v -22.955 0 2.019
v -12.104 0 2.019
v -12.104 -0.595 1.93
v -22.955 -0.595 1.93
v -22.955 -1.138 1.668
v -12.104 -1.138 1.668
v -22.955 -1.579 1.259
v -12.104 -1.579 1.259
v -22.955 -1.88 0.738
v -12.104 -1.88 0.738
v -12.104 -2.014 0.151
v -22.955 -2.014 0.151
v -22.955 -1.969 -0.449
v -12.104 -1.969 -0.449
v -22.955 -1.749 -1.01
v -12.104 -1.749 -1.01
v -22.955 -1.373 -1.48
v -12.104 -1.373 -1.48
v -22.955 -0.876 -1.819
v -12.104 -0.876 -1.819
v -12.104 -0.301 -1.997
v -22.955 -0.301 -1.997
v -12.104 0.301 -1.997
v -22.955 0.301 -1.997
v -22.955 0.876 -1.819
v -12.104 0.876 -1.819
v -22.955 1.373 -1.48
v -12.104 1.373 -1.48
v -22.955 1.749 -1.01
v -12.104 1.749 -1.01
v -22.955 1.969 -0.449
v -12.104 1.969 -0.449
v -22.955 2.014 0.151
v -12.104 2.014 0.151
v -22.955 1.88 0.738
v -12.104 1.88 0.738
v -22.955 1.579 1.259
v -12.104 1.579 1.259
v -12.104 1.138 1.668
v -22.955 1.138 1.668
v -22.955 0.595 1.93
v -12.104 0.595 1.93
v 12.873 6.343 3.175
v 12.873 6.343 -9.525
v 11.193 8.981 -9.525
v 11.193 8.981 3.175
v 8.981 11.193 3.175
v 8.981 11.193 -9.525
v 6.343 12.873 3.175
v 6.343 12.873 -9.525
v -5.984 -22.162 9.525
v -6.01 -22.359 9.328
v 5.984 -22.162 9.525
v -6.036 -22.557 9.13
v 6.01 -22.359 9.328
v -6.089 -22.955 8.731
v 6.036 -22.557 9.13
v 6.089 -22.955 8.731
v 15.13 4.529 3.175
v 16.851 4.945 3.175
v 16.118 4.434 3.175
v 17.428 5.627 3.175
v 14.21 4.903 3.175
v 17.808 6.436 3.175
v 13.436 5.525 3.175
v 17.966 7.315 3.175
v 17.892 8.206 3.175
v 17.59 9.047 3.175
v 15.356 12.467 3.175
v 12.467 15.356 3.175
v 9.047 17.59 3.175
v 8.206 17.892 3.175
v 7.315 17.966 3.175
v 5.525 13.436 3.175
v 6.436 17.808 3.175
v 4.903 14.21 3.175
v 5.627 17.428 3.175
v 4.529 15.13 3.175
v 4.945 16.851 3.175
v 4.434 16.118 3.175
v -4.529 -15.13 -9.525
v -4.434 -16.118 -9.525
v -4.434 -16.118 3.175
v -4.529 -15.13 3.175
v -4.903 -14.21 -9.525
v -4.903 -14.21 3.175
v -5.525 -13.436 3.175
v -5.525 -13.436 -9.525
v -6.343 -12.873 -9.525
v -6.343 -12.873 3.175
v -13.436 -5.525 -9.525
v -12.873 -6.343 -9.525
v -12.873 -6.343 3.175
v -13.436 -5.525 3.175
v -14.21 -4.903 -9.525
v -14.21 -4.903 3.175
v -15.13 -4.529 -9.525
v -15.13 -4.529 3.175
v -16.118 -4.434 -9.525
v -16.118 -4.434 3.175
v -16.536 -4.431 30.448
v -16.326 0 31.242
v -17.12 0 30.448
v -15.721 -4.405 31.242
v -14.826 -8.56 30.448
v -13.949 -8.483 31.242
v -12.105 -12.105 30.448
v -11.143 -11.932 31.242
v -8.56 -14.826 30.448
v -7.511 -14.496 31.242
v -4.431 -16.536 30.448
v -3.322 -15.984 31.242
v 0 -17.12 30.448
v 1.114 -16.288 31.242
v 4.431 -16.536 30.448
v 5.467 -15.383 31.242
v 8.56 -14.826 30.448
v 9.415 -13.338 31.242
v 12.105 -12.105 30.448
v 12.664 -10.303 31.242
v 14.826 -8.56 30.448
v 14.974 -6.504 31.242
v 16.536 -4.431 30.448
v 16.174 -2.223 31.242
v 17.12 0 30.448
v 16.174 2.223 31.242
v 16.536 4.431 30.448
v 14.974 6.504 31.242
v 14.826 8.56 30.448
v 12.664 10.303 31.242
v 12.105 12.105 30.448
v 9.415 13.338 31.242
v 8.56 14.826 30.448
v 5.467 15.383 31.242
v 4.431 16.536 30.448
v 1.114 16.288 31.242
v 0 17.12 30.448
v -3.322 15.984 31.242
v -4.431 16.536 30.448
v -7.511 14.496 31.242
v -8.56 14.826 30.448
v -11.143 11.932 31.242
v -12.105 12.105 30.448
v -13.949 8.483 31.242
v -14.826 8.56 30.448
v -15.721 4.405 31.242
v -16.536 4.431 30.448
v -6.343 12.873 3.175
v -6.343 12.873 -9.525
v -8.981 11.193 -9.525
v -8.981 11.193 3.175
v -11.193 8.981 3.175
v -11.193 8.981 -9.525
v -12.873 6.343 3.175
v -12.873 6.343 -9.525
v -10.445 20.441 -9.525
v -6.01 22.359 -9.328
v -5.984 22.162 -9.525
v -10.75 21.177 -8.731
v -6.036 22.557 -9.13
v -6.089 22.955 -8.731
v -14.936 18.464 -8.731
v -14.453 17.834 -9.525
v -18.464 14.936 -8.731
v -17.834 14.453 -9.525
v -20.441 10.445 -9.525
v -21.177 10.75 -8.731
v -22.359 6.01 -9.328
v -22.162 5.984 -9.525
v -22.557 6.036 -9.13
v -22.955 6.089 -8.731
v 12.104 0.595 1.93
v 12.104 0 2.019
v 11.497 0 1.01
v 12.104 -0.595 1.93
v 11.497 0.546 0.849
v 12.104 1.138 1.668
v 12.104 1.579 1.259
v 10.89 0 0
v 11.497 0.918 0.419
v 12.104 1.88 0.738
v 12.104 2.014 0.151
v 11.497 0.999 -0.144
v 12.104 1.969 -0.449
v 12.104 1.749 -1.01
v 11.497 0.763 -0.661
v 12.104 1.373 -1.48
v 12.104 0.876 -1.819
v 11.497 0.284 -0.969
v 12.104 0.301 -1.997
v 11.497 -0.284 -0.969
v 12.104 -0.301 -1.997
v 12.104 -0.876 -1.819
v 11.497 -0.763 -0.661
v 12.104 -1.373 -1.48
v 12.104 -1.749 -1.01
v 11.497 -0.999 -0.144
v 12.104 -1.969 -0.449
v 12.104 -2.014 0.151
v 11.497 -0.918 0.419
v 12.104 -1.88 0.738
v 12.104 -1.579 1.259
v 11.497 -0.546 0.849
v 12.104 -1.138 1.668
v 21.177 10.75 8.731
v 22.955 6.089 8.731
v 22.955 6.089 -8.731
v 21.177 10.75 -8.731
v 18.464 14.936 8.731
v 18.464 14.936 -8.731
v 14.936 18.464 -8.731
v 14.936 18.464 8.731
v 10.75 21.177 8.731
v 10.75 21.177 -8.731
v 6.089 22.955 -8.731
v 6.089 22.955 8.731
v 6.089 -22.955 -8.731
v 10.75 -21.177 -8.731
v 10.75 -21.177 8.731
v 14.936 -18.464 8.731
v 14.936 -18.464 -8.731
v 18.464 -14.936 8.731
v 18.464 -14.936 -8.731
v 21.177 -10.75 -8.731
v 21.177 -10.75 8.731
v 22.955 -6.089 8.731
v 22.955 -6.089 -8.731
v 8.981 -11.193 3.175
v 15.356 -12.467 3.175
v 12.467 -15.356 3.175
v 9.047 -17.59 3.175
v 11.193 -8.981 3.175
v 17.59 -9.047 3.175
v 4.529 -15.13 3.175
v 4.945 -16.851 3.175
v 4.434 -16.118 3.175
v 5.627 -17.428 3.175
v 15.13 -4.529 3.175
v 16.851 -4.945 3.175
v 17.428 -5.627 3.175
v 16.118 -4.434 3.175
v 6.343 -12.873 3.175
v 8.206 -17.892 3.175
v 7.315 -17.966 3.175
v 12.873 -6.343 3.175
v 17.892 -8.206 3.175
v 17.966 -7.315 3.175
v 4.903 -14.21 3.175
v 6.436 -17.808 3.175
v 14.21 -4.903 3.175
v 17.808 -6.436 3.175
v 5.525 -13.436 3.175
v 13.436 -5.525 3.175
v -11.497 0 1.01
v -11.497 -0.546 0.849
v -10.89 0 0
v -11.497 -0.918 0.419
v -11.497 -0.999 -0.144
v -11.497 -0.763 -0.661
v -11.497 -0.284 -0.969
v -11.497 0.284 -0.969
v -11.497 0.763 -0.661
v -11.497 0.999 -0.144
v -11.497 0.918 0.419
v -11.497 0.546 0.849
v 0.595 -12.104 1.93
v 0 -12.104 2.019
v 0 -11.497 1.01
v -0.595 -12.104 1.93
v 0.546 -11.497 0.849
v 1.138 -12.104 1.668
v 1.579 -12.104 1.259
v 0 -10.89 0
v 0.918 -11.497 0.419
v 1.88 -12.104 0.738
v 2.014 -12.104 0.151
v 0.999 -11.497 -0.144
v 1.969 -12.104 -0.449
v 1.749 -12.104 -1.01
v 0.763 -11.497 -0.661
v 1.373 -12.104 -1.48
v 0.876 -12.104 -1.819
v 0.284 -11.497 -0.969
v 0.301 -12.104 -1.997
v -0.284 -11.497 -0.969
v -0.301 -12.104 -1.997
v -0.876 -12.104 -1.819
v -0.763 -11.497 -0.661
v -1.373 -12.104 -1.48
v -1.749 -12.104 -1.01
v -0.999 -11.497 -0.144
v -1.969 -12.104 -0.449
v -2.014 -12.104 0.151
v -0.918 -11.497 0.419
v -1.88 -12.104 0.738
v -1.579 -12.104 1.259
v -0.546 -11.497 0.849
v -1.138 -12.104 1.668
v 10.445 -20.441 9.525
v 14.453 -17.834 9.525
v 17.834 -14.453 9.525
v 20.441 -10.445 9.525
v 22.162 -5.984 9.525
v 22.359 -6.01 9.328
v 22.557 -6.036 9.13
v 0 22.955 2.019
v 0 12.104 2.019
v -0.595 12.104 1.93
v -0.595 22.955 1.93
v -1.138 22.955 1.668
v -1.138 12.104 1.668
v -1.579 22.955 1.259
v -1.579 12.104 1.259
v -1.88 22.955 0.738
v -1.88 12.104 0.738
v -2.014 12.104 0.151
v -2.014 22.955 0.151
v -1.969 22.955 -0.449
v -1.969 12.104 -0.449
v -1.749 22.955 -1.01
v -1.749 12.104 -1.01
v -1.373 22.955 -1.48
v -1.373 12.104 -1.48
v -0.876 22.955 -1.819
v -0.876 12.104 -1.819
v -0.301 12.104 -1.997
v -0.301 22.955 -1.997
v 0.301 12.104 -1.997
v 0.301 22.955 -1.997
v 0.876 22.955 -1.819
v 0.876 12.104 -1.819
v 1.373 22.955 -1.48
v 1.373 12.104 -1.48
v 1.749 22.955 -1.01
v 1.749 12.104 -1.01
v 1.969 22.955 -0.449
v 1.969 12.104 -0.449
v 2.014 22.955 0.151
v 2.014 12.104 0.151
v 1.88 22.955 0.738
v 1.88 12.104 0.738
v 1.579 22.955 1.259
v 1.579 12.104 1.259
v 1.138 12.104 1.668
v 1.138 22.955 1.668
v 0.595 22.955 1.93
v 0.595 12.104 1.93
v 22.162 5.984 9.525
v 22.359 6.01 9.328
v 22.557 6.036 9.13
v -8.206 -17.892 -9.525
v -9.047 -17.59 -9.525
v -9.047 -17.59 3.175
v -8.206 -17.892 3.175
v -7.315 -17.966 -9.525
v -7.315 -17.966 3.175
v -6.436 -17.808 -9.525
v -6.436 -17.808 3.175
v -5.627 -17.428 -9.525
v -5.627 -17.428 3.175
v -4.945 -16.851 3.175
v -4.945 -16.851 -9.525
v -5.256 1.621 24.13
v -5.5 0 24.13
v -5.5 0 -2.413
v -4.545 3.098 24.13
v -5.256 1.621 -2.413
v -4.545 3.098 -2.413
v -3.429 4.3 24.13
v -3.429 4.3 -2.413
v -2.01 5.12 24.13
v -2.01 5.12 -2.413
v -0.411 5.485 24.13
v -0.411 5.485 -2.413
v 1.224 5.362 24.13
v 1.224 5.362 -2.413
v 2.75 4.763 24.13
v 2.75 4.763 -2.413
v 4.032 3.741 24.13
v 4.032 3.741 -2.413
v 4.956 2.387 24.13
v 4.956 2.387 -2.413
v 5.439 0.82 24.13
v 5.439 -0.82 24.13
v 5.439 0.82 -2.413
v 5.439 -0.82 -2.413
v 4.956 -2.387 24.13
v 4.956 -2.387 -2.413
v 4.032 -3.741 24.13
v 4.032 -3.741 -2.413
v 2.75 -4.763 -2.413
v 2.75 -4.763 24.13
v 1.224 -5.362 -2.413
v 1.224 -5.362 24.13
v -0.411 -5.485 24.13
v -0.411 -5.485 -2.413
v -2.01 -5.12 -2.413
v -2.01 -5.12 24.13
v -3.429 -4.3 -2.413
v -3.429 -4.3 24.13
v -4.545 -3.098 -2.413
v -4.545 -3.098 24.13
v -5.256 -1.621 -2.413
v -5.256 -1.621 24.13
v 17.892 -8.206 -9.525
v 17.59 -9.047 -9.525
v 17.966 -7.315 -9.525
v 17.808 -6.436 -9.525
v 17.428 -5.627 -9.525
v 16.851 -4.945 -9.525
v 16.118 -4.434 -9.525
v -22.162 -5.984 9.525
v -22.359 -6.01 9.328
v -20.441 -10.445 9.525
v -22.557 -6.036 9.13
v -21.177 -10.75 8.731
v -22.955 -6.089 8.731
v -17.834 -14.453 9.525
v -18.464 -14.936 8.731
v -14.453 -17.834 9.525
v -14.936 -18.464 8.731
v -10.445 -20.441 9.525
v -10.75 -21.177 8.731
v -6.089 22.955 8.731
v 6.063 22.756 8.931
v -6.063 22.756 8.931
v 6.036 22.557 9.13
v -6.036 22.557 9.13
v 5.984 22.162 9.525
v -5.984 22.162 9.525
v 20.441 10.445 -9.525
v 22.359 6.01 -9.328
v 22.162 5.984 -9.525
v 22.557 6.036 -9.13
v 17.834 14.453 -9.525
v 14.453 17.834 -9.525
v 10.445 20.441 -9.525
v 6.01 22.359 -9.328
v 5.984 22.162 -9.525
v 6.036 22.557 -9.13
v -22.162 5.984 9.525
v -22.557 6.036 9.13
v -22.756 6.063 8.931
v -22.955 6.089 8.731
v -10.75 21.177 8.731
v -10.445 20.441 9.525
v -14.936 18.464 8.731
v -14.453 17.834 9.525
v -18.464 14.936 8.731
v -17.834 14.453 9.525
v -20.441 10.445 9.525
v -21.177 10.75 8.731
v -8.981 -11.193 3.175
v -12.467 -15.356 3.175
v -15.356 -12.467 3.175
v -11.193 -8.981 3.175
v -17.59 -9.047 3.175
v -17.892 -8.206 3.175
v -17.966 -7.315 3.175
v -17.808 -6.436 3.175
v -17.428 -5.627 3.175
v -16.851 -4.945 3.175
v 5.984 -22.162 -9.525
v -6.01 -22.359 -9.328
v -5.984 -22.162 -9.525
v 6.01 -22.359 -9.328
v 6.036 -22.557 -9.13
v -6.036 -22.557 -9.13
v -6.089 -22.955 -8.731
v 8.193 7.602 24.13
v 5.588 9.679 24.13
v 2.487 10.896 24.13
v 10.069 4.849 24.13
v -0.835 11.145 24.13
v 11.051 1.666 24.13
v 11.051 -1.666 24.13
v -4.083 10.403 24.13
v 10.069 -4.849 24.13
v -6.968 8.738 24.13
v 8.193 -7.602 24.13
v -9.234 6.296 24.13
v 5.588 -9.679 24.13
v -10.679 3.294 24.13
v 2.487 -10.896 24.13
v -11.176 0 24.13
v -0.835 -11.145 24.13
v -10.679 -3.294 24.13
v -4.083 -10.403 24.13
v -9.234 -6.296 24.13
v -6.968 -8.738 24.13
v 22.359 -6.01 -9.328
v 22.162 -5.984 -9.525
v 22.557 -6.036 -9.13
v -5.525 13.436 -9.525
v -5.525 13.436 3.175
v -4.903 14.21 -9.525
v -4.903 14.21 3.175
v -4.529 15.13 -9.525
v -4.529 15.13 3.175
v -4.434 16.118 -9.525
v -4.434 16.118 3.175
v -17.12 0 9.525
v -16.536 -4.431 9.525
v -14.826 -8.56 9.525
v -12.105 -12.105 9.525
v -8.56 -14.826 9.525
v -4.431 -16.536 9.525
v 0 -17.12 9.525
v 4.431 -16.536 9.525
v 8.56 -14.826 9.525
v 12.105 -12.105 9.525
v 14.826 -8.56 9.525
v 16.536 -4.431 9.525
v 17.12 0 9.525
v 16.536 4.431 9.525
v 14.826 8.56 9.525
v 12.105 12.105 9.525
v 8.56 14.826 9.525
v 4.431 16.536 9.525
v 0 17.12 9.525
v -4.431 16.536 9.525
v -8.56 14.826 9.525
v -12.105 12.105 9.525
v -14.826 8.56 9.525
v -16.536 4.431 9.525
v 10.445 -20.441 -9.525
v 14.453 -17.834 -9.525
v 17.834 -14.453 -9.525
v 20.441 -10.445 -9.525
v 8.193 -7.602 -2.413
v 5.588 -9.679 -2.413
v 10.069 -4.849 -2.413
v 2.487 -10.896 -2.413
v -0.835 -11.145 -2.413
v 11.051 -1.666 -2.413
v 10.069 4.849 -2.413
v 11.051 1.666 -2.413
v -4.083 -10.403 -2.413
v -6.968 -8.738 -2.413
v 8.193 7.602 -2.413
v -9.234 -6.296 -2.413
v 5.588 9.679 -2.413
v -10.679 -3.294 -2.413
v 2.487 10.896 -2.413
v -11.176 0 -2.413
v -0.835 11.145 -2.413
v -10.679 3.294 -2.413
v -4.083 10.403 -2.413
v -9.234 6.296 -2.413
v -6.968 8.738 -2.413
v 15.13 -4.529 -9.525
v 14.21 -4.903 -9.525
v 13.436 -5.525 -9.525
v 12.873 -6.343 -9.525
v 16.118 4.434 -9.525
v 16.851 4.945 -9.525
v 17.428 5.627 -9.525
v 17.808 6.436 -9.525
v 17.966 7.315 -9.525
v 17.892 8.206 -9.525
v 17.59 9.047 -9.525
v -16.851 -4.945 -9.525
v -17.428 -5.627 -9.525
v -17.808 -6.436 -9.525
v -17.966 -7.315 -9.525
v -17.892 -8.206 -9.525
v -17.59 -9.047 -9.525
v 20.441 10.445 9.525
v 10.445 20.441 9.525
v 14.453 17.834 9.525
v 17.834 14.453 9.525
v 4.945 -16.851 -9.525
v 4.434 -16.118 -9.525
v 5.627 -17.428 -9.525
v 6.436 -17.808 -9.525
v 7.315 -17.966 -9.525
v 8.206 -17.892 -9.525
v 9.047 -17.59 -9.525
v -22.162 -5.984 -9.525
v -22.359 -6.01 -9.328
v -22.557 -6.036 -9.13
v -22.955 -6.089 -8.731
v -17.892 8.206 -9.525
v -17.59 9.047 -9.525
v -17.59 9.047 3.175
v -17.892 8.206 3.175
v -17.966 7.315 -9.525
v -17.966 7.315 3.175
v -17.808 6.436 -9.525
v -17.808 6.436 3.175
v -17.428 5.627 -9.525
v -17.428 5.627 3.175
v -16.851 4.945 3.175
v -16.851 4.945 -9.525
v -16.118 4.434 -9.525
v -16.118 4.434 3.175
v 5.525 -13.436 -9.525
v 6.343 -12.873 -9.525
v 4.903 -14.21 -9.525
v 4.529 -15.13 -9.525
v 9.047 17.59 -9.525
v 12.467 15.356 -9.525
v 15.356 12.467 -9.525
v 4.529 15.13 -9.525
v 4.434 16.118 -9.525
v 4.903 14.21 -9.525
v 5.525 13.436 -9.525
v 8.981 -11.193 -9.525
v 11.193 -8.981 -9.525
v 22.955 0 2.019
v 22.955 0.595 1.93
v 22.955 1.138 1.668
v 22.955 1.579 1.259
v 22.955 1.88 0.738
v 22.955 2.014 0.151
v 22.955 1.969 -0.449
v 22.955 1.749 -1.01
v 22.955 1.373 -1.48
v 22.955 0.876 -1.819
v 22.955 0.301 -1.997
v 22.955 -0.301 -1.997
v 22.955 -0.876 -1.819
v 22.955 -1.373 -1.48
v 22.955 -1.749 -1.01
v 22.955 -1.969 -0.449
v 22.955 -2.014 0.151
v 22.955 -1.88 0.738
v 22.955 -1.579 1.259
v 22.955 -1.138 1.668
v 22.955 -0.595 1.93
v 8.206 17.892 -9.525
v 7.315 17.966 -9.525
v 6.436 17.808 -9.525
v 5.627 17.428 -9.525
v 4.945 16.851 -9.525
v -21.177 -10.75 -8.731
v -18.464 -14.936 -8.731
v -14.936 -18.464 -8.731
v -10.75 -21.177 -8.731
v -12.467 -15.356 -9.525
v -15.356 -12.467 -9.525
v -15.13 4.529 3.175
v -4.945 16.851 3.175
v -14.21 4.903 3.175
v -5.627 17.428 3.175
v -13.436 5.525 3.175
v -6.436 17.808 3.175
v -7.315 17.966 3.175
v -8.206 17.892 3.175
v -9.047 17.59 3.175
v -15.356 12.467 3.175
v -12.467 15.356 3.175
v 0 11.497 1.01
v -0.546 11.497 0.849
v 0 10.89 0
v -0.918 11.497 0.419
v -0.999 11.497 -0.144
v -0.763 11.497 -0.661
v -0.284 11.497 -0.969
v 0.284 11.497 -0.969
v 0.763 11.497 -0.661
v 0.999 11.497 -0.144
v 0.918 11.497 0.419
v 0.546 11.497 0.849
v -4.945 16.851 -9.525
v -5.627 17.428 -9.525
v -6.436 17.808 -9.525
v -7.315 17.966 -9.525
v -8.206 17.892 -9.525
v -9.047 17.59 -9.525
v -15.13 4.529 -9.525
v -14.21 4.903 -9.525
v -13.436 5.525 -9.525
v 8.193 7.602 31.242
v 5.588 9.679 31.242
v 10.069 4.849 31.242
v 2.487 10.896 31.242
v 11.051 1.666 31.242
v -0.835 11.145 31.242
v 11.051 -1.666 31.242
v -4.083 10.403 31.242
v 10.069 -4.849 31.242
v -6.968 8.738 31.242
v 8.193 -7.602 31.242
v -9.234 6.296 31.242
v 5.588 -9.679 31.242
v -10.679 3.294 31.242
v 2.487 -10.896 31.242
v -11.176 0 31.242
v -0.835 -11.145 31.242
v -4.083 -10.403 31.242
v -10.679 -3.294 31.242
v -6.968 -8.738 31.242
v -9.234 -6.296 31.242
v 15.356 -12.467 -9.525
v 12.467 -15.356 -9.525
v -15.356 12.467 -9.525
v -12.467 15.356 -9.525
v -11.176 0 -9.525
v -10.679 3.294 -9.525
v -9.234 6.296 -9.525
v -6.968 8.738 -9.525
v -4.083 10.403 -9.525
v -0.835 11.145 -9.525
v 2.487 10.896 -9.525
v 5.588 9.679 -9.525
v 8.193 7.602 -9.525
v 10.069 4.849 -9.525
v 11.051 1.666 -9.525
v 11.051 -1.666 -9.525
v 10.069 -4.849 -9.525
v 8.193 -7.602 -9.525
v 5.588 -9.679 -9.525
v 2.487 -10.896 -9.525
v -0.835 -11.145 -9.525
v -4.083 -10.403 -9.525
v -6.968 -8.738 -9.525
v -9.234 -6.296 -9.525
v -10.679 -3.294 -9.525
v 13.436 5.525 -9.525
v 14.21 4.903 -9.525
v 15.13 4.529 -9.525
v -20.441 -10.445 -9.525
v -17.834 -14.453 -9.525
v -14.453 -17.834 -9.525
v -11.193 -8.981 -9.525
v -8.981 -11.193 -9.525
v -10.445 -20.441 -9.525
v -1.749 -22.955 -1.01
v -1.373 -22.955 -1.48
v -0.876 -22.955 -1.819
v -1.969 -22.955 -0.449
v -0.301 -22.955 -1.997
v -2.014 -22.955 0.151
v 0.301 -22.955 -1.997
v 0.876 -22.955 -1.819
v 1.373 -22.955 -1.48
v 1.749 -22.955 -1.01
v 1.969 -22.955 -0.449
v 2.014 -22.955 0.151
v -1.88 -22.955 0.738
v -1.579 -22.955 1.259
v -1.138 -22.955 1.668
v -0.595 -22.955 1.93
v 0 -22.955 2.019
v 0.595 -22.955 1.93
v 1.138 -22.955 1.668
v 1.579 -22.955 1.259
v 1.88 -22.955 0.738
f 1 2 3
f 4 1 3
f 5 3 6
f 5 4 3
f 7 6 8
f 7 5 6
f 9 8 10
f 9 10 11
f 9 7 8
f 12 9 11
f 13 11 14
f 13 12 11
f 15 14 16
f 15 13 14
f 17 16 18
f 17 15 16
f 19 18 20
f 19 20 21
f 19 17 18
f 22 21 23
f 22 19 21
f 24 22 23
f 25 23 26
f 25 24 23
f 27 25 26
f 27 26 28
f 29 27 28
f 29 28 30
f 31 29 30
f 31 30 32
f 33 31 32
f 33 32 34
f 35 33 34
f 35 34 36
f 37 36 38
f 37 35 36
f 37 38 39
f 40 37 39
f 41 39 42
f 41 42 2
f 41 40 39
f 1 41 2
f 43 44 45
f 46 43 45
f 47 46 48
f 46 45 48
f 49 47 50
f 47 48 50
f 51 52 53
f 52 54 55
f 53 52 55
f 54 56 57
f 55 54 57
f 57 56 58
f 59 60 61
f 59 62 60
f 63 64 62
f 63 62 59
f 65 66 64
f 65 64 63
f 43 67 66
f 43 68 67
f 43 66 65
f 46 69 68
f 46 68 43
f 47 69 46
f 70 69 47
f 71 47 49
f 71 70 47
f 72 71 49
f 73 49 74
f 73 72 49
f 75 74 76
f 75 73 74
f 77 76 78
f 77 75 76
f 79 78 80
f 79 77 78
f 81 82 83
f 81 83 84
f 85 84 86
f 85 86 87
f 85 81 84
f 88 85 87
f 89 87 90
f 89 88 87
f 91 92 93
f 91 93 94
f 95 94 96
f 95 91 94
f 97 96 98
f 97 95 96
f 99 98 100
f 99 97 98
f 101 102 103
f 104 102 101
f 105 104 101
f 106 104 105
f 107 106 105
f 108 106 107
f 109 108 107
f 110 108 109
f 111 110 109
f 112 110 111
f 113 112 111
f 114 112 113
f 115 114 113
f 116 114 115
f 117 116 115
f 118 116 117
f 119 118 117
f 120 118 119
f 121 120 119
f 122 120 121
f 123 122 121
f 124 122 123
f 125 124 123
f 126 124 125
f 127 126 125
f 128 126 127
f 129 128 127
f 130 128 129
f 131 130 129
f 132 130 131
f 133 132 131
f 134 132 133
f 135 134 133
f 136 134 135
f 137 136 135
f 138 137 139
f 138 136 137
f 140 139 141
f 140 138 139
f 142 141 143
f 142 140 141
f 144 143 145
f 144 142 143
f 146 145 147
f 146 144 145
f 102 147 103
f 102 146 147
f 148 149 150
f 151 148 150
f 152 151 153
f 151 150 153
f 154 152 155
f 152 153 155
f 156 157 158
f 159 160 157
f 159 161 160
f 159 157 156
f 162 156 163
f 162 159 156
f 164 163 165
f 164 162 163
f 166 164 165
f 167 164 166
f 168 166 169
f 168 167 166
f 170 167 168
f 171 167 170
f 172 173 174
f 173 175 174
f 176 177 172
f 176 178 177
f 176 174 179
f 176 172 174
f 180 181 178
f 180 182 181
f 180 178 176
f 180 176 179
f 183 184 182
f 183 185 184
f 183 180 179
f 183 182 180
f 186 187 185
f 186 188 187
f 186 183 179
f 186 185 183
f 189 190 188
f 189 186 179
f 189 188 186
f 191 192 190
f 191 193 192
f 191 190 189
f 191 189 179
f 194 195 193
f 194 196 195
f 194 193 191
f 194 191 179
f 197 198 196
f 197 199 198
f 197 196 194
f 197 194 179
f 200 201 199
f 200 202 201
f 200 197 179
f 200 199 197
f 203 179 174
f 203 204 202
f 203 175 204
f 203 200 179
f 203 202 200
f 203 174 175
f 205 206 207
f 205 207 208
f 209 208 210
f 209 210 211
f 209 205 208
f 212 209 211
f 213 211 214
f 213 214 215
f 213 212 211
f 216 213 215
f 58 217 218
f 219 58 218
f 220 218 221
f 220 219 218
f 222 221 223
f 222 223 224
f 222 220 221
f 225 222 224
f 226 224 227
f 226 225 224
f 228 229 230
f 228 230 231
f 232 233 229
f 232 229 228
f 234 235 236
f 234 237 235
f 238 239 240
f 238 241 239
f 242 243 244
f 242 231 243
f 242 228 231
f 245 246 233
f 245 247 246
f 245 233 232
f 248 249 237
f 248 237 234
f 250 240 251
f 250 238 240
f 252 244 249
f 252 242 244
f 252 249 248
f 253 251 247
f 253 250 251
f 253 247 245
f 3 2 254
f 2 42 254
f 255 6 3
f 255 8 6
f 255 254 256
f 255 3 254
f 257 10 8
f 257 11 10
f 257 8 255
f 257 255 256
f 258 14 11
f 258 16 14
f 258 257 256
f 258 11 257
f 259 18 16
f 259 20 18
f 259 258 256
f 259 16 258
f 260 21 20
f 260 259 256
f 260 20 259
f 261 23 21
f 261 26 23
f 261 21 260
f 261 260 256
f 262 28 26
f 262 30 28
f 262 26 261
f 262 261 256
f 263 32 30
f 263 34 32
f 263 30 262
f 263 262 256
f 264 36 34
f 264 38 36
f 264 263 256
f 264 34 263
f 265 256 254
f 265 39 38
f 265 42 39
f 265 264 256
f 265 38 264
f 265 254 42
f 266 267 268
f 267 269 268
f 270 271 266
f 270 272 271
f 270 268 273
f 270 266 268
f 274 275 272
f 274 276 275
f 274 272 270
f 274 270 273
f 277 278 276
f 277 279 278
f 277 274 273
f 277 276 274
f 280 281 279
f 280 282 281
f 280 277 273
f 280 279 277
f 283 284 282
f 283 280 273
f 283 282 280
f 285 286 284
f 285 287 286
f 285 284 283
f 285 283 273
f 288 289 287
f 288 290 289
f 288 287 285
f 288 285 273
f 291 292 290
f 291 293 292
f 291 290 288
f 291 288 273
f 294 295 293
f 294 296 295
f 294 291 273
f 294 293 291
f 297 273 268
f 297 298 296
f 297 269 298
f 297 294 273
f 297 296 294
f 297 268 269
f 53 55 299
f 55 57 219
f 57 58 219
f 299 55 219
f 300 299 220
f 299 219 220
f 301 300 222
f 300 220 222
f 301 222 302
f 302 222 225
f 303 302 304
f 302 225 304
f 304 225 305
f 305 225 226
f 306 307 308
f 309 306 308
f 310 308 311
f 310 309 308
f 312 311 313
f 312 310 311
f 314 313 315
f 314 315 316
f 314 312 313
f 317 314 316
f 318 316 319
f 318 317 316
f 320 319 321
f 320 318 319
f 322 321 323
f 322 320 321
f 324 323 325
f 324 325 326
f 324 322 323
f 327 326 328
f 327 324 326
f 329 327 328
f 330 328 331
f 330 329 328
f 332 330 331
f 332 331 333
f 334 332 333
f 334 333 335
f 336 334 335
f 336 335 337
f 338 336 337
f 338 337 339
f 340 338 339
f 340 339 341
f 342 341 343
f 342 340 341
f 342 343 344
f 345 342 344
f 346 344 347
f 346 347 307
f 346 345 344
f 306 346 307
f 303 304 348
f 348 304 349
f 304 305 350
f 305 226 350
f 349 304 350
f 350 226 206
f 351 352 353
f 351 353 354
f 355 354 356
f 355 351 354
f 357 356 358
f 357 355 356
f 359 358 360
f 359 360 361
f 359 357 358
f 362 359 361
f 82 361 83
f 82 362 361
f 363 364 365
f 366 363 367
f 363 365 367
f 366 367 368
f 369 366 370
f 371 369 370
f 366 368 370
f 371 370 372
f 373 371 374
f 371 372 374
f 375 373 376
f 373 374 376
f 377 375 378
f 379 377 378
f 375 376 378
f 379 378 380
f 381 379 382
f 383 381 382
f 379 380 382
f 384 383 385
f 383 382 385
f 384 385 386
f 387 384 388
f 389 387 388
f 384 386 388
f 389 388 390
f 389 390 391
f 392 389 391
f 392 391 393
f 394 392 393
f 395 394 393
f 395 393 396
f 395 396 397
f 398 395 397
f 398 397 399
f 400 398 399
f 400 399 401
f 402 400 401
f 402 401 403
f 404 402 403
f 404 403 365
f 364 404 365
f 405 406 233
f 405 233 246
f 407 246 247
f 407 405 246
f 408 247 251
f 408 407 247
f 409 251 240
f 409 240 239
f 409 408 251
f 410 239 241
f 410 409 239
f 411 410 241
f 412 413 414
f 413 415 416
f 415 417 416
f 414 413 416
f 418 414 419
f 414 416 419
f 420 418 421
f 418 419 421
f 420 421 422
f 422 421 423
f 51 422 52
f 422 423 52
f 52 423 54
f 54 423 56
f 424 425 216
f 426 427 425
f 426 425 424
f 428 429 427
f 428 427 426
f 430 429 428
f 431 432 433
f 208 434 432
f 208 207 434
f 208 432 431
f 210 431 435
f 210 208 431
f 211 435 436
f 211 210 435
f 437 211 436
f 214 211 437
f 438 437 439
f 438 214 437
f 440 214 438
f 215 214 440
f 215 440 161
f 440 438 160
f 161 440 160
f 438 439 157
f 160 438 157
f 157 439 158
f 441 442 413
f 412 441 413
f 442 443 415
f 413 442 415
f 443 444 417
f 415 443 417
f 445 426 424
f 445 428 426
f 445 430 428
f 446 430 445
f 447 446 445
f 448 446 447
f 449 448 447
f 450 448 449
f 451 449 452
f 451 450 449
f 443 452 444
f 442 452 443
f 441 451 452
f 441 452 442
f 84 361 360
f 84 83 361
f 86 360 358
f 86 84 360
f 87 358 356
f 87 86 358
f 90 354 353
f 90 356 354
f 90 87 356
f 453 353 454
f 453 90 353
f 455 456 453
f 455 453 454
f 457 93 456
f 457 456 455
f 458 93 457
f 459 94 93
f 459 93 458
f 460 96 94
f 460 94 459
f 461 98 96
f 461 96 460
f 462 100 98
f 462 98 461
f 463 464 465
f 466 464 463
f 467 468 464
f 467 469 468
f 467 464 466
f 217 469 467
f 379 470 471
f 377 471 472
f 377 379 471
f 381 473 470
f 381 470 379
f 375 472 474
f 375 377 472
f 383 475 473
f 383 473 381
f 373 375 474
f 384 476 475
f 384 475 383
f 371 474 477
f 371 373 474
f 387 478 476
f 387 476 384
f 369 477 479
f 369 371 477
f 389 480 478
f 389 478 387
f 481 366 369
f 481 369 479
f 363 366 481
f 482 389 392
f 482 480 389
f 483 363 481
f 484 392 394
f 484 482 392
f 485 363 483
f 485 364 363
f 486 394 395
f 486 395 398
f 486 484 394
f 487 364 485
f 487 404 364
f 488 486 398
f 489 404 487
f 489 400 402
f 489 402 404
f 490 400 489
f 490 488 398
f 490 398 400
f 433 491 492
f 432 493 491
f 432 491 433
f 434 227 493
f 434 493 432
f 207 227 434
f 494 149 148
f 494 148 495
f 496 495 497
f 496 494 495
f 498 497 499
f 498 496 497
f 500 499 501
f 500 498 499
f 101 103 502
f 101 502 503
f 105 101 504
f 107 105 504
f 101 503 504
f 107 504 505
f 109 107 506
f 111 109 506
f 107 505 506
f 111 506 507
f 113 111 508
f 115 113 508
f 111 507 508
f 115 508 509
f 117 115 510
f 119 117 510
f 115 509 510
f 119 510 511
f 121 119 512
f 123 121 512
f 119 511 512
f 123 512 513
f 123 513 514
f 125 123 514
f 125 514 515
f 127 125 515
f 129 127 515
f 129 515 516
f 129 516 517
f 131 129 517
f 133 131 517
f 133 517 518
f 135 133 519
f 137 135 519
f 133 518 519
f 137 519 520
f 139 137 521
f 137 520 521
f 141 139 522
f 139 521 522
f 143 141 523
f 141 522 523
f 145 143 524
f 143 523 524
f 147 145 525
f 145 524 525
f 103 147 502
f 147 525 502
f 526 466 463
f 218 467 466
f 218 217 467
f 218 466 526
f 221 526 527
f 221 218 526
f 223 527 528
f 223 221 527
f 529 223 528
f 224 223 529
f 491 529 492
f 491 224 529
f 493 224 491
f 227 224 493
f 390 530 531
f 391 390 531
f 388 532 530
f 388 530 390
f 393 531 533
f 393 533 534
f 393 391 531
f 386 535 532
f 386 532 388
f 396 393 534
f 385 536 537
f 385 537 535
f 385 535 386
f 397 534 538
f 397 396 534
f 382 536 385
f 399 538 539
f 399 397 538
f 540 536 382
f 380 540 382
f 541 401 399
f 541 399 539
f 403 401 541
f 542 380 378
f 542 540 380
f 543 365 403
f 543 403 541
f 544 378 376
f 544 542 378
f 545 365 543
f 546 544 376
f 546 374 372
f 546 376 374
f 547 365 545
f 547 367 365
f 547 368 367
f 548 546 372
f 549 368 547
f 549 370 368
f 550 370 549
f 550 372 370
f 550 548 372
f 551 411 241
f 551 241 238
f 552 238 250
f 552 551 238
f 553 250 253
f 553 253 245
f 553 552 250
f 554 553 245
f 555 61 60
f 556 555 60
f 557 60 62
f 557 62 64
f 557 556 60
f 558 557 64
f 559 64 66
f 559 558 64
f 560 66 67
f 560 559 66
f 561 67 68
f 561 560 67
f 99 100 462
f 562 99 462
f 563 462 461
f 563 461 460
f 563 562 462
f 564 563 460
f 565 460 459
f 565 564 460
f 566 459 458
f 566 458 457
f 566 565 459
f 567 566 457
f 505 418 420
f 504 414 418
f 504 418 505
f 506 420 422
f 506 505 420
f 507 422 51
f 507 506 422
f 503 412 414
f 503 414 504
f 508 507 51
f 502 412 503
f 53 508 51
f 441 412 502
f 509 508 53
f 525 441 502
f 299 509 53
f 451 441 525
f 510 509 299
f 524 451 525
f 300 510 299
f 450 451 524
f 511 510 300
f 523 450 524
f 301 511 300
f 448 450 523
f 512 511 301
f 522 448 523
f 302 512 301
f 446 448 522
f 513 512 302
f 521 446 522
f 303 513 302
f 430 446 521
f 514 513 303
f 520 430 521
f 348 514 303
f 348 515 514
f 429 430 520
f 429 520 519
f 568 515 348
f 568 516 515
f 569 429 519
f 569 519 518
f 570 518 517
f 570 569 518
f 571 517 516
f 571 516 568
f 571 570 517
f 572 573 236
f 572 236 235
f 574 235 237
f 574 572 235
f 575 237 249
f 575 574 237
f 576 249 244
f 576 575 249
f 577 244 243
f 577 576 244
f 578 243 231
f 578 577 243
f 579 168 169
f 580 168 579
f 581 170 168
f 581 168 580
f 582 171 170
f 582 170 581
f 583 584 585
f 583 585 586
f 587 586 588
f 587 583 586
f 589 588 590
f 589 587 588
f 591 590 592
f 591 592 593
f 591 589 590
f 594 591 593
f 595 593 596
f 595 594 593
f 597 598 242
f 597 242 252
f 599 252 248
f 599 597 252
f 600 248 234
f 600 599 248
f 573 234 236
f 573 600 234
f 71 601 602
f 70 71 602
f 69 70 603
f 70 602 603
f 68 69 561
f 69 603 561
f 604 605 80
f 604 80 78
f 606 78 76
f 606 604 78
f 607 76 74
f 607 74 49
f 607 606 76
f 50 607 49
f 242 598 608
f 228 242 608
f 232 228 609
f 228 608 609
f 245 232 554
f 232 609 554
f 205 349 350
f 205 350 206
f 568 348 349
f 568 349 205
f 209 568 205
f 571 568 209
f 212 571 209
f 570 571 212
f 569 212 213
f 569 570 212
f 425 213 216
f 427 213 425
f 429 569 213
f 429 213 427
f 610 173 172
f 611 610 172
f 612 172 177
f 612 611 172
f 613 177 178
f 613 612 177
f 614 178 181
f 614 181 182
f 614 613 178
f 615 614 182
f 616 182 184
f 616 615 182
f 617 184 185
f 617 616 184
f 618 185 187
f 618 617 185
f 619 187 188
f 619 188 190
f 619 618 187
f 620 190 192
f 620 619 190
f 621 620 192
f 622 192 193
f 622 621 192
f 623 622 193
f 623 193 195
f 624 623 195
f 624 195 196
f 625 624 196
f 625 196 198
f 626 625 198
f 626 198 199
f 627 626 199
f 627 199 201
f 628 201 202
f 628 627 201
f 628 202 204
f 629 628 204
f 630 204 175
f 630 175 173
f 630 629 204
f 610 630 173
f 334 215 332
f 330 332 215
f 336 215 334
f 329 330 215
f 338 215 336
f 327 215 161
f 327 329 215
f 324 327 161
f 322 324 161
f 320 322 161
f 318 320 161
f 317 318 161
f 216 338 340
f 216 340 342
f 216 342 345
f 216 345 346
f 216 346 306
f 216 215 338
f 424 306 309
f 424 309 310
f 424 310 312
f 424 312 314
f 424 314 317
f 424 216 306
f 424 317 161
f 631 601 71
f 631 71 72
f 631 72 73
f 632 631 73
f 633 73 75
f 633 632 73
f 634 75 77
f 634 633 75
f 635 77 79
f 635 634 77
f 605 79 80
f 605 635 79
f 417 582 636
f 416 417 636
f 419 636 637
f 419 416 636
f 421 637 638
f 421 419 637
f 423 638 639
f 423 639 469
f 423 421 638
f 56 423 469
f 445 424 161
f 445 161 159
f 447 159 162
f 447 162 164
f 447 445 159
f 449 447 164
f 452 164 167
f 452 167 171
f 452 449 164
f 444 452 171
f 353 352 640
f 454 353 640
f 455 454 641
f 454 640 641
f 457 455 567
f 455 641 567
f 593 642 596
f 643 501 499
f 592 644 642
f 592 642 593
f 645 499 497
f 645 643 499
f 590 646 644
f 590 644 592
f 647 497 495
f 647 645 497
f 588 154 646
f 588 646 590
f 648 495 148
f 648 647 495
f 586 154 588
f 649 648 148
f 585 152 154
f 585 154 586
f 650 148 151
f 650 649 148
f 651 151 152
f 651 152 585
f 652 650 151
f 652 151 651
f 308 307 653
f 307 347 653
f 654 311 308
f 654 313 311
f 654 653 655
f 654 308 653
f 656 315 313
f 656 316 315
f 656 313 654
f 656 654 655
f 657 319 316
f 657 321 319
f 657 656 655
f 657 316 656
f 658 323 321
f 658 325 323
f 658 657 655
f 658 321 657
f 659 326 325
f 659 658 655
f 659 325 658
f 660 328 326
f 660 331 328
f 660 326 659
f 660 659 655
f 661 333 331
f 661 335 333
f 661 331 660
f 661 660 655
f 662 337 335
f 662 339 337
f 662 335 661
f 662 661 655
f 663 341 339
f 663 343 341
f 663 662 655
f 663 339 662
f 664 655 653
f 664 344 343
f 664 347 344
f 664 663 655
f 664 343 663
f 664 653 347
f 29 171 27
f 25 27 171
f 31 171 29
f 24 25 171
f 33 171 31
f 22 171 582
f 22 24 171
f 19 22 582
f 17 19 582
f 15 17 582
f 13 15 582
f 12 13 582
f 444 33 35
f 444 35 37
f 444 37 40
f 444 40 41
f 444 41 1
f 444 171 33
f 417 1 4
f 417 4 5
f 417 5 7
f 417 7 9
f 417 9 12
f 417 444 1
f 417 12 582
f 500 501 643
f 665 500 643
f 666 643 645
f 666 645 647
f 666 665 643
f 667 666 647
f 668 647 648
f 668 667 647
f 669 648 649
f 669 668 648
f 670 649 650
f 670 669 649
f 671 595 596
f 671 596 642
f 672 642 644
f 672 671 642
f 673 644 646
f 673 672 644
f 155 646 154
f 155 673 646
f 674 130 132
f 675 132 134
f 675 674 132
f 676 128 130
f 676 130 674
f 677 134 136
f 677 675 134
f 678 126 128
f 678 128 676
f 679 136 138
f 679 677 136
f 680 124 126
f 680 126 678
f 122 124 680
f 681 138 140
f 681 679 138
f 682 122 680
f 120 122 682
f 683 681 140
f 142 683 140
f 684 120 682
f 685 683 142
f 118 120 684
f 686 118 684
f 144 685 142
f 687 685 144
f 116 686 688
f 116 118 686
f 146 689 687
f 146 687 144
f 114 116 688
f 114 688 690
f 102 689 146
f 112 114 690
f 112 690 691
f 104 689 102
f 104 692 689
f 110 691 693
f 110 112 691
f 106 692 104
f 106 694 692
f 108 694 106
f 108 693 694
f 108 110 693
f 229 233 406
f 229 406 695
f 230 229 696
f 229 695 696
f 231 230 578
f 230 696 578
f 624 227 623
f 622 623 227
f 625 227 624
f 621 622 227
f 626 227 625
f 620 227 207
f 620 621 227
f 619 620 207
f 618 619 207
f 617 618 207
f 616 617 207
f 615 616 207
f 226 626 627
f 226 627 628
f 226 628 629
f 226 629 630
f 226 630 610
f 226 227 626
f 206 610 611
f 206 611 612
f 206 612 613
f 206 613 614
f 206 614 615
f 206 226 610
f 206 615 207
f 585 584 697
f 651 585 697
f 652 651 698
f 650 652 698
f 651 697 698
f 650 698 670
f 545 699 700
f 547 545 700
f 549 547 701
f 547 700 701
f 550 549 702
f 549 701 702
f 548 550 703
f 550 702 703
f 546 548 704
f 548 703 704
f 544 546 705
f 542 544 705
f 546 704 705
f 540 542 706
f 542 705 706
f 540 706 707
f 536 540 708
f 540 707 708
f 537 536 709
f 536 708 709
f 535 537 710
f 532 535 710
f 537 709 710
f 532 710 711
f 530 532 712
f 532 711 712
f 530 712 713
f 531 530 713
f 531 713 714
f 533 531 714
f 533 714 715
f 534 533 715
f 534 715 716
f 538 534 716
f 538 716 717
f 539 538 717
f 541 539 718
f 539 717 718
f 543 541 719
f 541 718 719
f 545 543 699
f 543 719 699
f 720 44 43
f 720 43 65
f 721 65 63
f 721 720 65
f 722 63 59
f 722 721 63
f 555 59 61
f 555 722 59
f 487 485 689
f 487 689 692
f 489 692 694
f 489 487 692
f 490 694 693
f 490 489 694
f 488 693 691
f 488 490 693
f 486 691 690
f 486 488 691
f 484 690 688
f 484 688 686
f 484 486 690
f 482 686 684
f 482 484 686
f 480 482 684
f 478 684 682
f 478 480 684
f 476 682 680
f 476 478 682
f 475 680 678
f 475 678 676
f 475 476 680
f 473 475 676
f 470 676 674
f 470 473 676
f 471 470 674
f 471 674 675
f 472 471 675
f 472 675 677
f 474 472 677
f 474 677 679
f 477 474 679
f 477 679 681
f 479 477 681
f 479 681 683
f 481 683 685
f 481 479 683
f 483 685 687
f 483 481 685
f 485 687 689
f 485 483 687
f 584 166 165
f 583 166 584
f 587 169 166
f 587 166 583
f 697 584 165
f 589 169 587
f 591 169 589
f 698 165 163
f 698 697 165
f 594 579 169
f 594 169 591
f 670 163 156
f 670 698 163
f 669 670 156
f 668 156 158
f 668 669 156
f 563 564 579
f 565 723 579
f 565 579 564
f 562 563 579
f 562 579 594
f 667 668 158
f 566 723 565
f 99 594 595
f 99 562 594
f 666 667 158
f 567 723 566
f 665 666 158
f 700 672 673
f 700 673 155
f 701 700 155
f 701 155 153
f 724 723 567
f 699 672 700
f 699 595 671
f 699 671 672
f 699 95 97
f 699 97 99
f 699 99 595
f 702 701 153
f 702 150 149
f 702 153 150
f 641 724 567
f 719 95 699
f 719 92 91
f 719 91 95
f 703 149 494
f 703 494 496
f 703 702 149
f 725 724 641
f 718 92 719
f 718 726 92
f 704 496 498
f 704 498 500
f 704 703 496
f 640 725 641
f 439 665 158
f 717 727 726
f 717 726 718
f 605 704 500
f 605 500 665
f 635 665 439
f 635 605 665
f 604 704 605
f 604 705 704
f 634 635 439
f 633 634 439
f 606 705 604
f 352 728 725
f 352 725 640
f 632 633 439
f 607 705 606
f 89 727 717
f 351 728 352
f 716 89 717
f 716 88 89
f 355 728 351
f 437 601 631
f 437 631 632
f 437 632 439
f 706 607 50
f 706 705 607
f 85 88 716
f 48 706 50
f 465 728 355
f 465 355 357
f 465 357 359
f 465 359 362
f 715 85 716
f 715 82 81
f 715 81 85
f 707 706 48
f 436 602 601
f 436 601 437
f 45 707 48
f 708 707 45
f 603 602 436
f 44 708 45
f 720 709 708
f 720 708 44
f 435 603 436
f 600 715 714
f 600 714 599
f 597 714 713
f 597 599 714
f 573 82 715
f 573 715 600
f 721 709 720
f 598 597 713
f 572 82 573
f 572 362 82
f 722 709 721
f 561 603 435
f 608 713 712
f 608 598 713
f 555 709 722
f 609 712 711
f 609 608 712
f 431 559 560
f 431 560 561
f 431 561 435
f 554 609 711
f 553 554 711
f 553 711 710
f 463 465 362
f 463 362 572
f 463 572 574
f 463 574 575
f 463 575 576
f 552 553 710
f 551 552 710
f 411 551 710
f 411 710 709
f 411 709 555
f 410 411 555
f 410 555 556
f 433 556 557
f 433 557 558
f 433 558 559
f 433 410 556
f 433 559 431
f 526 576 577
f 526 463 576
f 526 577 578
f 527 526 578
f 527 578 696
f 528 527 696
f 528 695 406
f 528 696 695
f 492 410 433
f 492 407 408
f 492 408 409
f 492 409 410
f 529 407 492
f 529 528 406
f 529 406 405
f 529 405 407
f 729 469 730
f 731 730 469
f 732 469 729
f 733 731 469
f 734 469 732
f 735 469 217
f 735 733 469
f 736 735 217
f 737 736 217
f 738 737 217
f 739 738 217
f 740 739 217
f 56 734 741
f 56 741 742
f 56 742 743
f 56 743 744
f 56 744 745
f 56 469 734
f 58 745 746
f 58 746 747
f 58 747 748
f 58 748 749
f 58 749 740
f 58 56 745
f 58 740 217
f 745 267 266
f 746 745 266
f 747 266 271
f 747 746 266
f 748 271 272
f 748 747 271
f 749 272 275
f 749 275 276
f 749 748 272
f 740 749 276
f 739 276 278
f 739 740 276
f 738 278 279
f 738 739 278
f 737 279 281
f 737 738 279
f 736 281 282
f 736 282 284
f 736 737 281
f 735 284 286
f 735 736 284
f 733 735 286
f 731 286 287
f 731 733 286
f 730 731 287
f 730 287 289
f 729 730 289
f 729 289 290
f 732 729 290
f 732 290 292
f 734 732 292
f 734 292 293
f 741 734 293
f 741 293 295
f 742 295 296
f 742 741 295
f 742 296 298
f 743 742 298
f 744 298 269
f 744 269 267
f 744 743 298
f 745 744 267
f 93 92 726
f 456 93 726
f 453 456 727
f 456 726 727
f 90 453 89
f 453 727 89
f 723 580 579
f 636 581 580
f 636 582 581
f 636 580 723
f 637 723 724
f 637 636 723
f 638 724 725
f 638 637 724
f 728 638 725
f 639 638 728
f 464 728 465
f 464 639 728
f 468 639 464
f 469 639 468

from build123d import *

# Parameters (mm, degrees)
BOSS_EXTRUDE1_DEPTH = 9.525
SKETCH2_R           = 11.176
SKETCH2_R_2         = 5.500370000000001
CUT_EXTRUDE1_DEPTH  = 7.112
SKETCH3_R           = 17.119600000000002
BOSS_EXTRUDE2_DEPTH = 21.717
SKETCH2_3_R         = 5.500370000000001
CUT_EXTRUDE2_DEPTH  = 53.11367665138399
CUT_EXTRUDE3_START  = -7.112
SKETCH4_R           = 11.176
CUT_EXTRUDE3_DEPTH  = 7.112
CIRPATTERN1_COUNT   = 4
CHAMFER2_SIZE       = 0.79375
CUT_EXTRUDE4_DEPTH  = 12.7
FILLET2_R           = 3.429


# Some blends are built 0.0001 mm under size
with BuildPart() as part:
    # Sketch1 → Boss-Extrude1 (new, symmetric)
    with BuildSketch(Plane.XY):
        with BuildLine():
            Line((6.0886368291679185, 22.95525), (-6.0886368291679185, 22.95525))
            ThreePointArc((-6.088636829167921, 22.955250000000003), (-16.793078946399227, 16.793078946399408), (-22.95524999999994, 6.088636829168165))
            Line((-22.95524999999994, 6.08863682916816), (-22.955250000000003, 0))
            Line((-22.955250000000003, 0), (22.95525, 0))
            Line((22.95525, 0), (22.95525000000002, 6.088636829167839))
            ThreePointArc((22.955250000000024, 6.088636829167841), (16.793078946399348, 16.79307894639929), (6.0886368291679185, 22.955250000000003))
        make_face()
        with BuildLine():
            Line((22.95525, 0), (-22.955250000000003, 0))
            Line((-22.955250000000003, 0), (-22.955250000000063, -6.088636829167679))
            ThreePointArc((-22.955250000000067, -6.0886368291676805), (-16.79307894639947, -16.793078946399167), (-6.088636829168085, -22.95524999999996))
            Line((-6.088636829168078, -22.955249999999957), (6.08863682916776, -22.955250000000042))
            ThreePointArc((6.08863682916775, -22.955250000000046), (16.793078946399223, -16.79307894639941), (22.95524999999998, -6.088636829168005))
            Line((22.955249999999978, -6.088636829167999), (22.95525, 0))
        make_face()
    extrude(amount=BOSS_EXTRUDE1_DEPTH, both=True)

    # Sketch2 → Cut-Extrude1 (cut)
    # profile 1 of 2: a face of its own
    with BuildSketch(Plane(origin=(0, 0, -9.525), x_dir=(-1, 0, 0), z_dir=(0, 0, -1))):
        Circle(SKETCH2_R)
        Circle(SKETCH2_R_2, mode=Mode.SUBTRACT)
    # profile 2 of 2: a face of its own
    with BuildSketch(Plane(origin=(0, 0, -9.525), x_dir=(-1, 0, 0), z_dir=(0, 0, -1))):
        Circle(SKETCH2_R_2)
    extrude(amount=-CUT_EXTRUDE1_DEPTH, mode=Mode.SUBTRACT)

    # Sketch3 → Boss-Extrude2 (add)
    with BuildSketch(Plane.XY.offset(9.525)):
        with Locations(Location((0, 0, 0), (0, 0, 180))):
            Circle(SKETCH3_R)
    extrude(amount=BOSS_EXTRUDE2_DEPTH)

    # Sketch2<3> → Cut-Extrude2 (cut, through all)
    with BuildSketch(Plane(origin=(0, 0, -9.525), x_dir=(-1, 0, 0), z_dir=(0, 0, -1))):
        Circle(SKETCH2_3_R)
    extrude(amount=-CUT_EXTRUDE2_DEPTH, mode=Mode.SUBTRACT)

    # Sketch4 → Cut-Extrude3 (cut)
    with BuildSketch(Plane.XY.offset(31.241999999999997).offset(CUT_EXTRUDE3_START)):
        with Locations(Location((0, 0, 0), (0, 0, 180))):
            Circle(SKETCH4_R)
    extrude(amount=CUT_EXTRUDE3_DEPTH, mode=Mode.SUBTRACT)

    # Sketch7 → #10-32 Tapped Hole1 (revolve, cut)
    with BuildSketch(Plane(origin=(-22.95525, 2.3545e-13, 0), x_dir=(0, 0, 1), z_dir=(1.026e-14, 1, 0))):
        Polygon((0, 0), (-3.04e-15, 12.065), (2.019299999999997, 10.851682151997645), (2.0192999999999897, -1.31e-15), align=None)
    f_10_32_tapped_hole1 = revolve(axis=Axis((-29.30524999999999, 3.0058e-13, 0), (1, -1.026e-14, 0)), mode=Mode.SUBTRACT)

    # CirPattern1: #10-32 Tapped Hole1 ×4 about axis
    cirpattern1_axis = Axis((0, 0, 31.241999999999997), (0, 0, 1))
    for i in range(1, CIRPATTERN1_COUNT):
        add(f_10_32_tapped_hole1.rotate(cirpattern1_axis, i * 360 / CIRPATTERN1_COUNT), mode=Mode.SUBTRACT)

    # Chamfer2
    chamfer2_edges = [part.edges().sort_by_distance(p)[0] for p in [
        (16.793078946399344, 16.79307894639929, -9.525),
        (22.95525, -8.171e-14, -9.525),
        (-16.793078946399465, -16.79307894639917, 9.525),
        (16.793078946399223, -16.79307894639941, -9.525),
        (-1.5898e-13, -22.95525, -9.525),
        (-16.793078946399465, -16.79307894639917, -9.525),
        (-22.955250000000003, 2.407e-13, -9.525),
        (-1.5898e-13, -22.95525, 9.525),
        (16.793078946399223, -16.79307894639941, 9.525),
        (22.95525, -8.082e-14, 9.525),
        (16.793078946399344, 16.79307894639929, 9.525),
        (17.119600000000002, -4.19e-15, 31.241999999999997),
        (0, 22.95525, 9.525),
        (-16.79307894639923, 16.79307894639941, 9.525),
        (-22.955250000000003, 2.4158e-13, 9.525),
        (-16.79307894639923, 16.79307894639941, -9.525),
        (0, 22.95525, -9.525),
    ]]
    chamfer(chamfer2_edges, length=CHAMFER2_SIZE - 0.0001)  # a hair under: the kernel refuses the full size

    # Sketch8 → Cut-Extrude4 (cut)
    with BuildSketch(Plane(origin=(0, 0, -9.525), x_dir=(-1, 0, 0), z_dir=(0, 0, -1))):
        with BuildLine():
            ThreePointArc((-3.7411998688127595, -13.854769017980608), (-10.14768941680823, -10.147689416808056), (-13.854769017980674, -3.741199868812521))
            Line((-13.854769017980672, -3.7411998688125214), (-19.096285615491066, -5.156565305907526))
            ThreePointArc((-19.096285615491066, -5.1565653059075265), (-13.986748908565335, -13.98674890856509), (-5.156565305907854, -19.09628561549097))
            Line((-5.156565305907857, -19.096285615490967), (-3.741199868812765, -13.854769017980608))
        make_face()
        with BuildLine():
            ThreePointArc((13.854769017980626, -3.7411998688126986), (10.147689416808095, -10.14768941680819), (3.741199868812558, -13.854769017980665))
            Line((3.7411998688125703, -13.854769017980663), (5.156565305907591, -19.09628561549104))
            ThreePointArc((5.156565305907593, -19.096285615491045), (13.986748908565135, -13.986748908565279), (19.09628561549099, -5.156565305907787))
            Line((19.096285615490988, -5.1565653059077885), (13.854769017980622, -3.741199868812714))
        make_face()
        with BuildLine():
            Line((5.156565305907724, 19.096285615491006), (3.741199868812667, 13.854769017980631))
            ThreePointArc((3.7411998688126653, 13.854769017980633), (10.147689416808161, 10.147689416808124), (13.854769017980649, 3.741199868812616))
            Line((13.854769017980647, 3.741199868812618), (19.096285615491023, 5.156565305907658))
            ThreePointArc((19.096285615491027, 5.15656530590766), (13.98674890856523, 13.986748908565183), (5.156565305907728, 19.09628561549101))
        make_face()
        with BuildLine():
            ThreePointArc((-5.1565653059077246, 19.096285615491006), (-13.986748908565236, 13.986748908565183), (-19.096285615491023, 5.1565653059076535))
            Line((-19.096285615491023, 5.156565305907655), (-13.854769017980647, 3.7411998688126173))
            ThreePointArc((-13.854769017980647, 3.741199868812617), (-10.14768941680816, 10.147689416808126), (-3.741199868812667, 13.854769017980633))
            Line((-3.741199868812666, 13.854769017980635), (-5.1565653059077246, 19.096285615491006))
        make_face()
    extrude(amount=-CUT_EXTRUDE4_DEPTH, mode=Mode.SUBTRACT)

    # Fillet2
    # the kernel refuses this fillet: 3.429 mm, written as the material it adds along each edge
    with BuildSketch(Plane(origin=(-5.156565305907593, -19.096285615491045, -9.525), x_dir=(-0.9325520544220317, 0.3610355464400257, 0), z_dir=(0, 0, 1))) as fillet2_piece_1:
        with BuildLine():
            CenterArc((3.8097835082284277, -3.409884824393312), FILLET2_R, 83.94735795443728, 102.10528409112533)
            Line((0.39989868383511423, -3.771446000921142), (0, 0))
            ThreePointArc((0, 0), (2.085672342378129, 0.11026624447191213), (4.171344684756262, 8e-17))
        make_face()
    extrude(amount=12.7)
    with BuildSketch(Plane(origin=(-19.096285615491027, 5.15656530590766, -9.525), x_dir=(0.965421853388659, -0.26069262551826505, 0), z_dir=(0, 0, 1))) as fillet2_piece_2:
        with BuildLine():
            CenterArc((3.792588020758013, 3.4290000000000003), FILLET2_R, 167.8947159088747, 102.10528409112533)
            ThreePointArc((0.4398356056936713, 4.148091262135922), (0.11026624447190661, 2.0856723423781296), (0, 0))
            Line((0, 0), (3.7925880207580134, -5e-17))
        make_face()
    extrude(amount=12.7)
    with BuildSketch(Plane(origin=(-5.156565305907726, 19.096285615491006, -9.525), x_dir=(0.26069262551826866, -0.9654218533886582, 0), z_dir=(0, 0, 1))) as fillet2_piece_3:
        with BuildLine():
            CenterArc((3.792588020758004, -3.4290000000000003), FILLET2_R, 89.99999999999996, 102.10528409112538)
            ThreePointArc((0.4398356056936635, -4.148091262135923), (0.11026624447190603, -2.0856723423781314), (0, 0))
            Line((0, 0), (3.7925880207580063, -7e-17))
        make_face()
    extrude(amount=12.7)
    with BuildSketch(Plane(origin=(-13.854769017980626, -3.741199868812707, -9.525), x_dir=(-0.9654218533886567, -0.26069262551827366, 0), z_dir=(0, 0, 1))) as fillet2_piece_4:
        with BuildLine():
            CenterArc((3.095213314069055, 3.4289999999999994), FILLET2_R, 191.11957095345258, 78.88042904654725)
            ThreePointArc((-0.2694135393585486, 2.7676928571428627), (-0.06751218545229558, 1.3903873027568008), (0, 0))
            Line((0, 0), (3.095213314069046, -1e-16))
        make_face()
    extrude(amount=12.7)
    with BuildSketch(Plane(origin=(-19.09628561549099, -5.156565305907787, -9.525), x_dir=(0.9654218533886576, 0.26069262551827094, 0), z_dir=(0, 0, 1))) as fillet2_piece_5:
        with BuildLine():
            CenterArc((3.7925880207580076, -3.4290000000000007), FILLET2_R, 90.00000000000001, 102.10528409112538)
            ThreePointArc((0.439835605693668, -4.148091262135926), (0.11026624447190793, -2.0856723423781336), (0, 0))
            Line((0, 0), (3.792588020758007, 3e-17))
        make_face()
    extrude(amount=12.7)
    with BuildSketch(Plane(origin=(-3.741199868812565, -13.854769017980665, -9.525), x_dir=(-0.2606926255182637, -0.9654218533886595, 0), z_dir=(0, 0, 1))) as fillet2_piece_6:
        with BuildLine():
            CenterArc((3.095213314069052, -3.429), FILLET2_R, 90.00000000000011, 78.88042904654733)
            ThreePointArc((-0.26941353935855195, -2.7676928571428654), (-0.06751218545229434, -1.3903873027568034), (0, 0))
            Line((0, 0), (3.095213314069045, 2e-17))
        make_face()
    extrude(amount=12.7)
    with BuildSketch(Plane(origin=(5.156565305907854, -19.09628561549097, -9.525), x_dir=(0.9325520544220268, 0.36103554644003844, 0), z_dir=(0, 0, 1))) as fillet2_piece_7:
        with BuildLine():
            CenterArc((3.8097835082284335, 3.409884824393312), FILLET2_R, 173.94735795443748, 102.10528409112516)
            Line((0.3998986838351195, 3.7714460009211352), (0, 0))
            ThreePointArc((0, 0), (2.0856723423781314, -0.11026624447191156), (4.171344684756263, -1.5e-16))
        make_face()
    extrude(amount=12.7)
    with BuildSketch(Plane(origin=(3.741199868812762, -13.854769017980608, -9.525), x_dir=(0.9356231316515913, 0.3530005035668774, 0), z_dir=(0, 0, 1))) as fillet2_piece_8:
        with BuildLine():
            CenterArc((3.112991040685577, -3.412868769847682), FILLET2_R, 95.55978547672635, 78.88042904654728)
            Line((-0.29987772916210453, -3.080652334675703), (0, 0))
            ThreePointArc((0, 0), (1.3903873027568012, -0.06751218545229684), (2.7807746055135993, 2e-17))
        make_face()
    extrude(amount=12.7)
    with BuildSketch(Plane(origin=(19.096285615491063, -5.156565305907526, -9.525), x_dir=(-0.36103554644002145, -0.9325520544220334, 0), z_dir=(0, 0, 1))) as fillet2_piece_9:
        with BuildLine():
            CenterArc((3.8097835082284273, -3.4098848243933118), FILLET2_R, 83.94735795443727, 102.10528409112533)
            Line((0.39989868383511423, -3.771446000921139), (0, 0))
            ThreePointArc((0, 0), (2.08567234237813, 0.11026624447191419), (4.171344684756262, 9e-17))
        make_face()
    extrude(amount=12.7)
    with BuildSketch(Plane(origin=(13.854769017980672, -3.741199868812522, -9.525), x_dir=(0.9654218533886609, -0.2606926255182579, 0), z_dir=(0, 0, 1))) as fillet2_piece_10:
        with BuildLine():
            CenterArc((3.095213314069046, -3.4289999999999994), FILLET2_R, 89.99999999999999, 78.88042904654729)
            ThreePointArc((-0.26941353935855583, -2.7676928571428556), (-0.06751218545229619, -1.3903873027567997), (0, 0))
            Line((0, 0), (3.0952133140690474, 2e-17))
        make_face()
    extrude(amount=12.7)
    with BuildSketch(Plane(origin=(13.854769017980647, 3.7411998688126173, -9.525), x_dir=(-0.3530005035668672, 0.9356231316515952, 0), z_dir=(0, 0, 1))) as fillet2_piece_11:
        with BuildLine():
            CenterArc((3.1129910406855728, -3.412868769847681), FILLET2_R, 95.55978547672636, 78.88042904654723)
            Line((-0.29987772916210814, -3.0806523346756998), (0, 0))
            ThreePointArc((0, 0), (1.3903873027567972, -0.06751218545229692), (2.780774605513595, -5e-17))
        make_face()
    extrude(amount=12.7)
    with BuildSketch(Plane(origin=(19.09628561549102, 5.1565653059076535, -9.525), x_dir=(-0.9654218533886593, -0.2606926255182644, 0), z_dir=(0, 0, 1))) as fillet2_piece_12:
        with BuildLine():
            CenterArc((3.7925880207580005, -3.429), FILLET2_R, 90.00000000000001, 102.10528409112527)
            ThreePointArc((0.4398356056936603, -4.148091262135919), (0.11026624447190564, -2.0856723423781256), (0, 0))
            Line((0, 0), (3.792588020758, -7e-17))
        make_face()
    extrude(amount=12.7)
    with BuildSketch(Plane(origin=(3.7411998688126658, 13.854769017980633, -9.525), x_dir=(0.9356231316515938, -0.35300050356687046, 0), z_dir=(0, 0, 1))) as fillet2_piece_13:
        with BuildLine():
            CenterArc((3.1129910406855763, 3.412868769847681), FILLET2_R, 185.55978547672632, 78.8804290465473)
            Line((-0.29987772916210376, 3.080652334675704), (0, 0))
            ThreePointArc((0, 0), (1.3903873027567977, 0.06751218545229833), (2.780774605513599, 1.1e-16))
        make_face()
    extrude(amount=12.7)
    with BuildSketch(Plane(origin=(5.1565653059077246, 19.096285615491006, -9.525), x_dir=(0.9325520544220295, -0.3610355464400313, 0), z_dir=(0, 0, 1))) as fillet2_piece_14:
        with BuildLine():
            CenterArc((3.8097835082284233, -3.4098848243933118), FILLET2_R, 83.9473579544373, 102.10528409112527)
            Line((0.39989868383510974, -3.7714460009211384), (0, 0))
            ThreePointArc((0, 0), (2.0856723423781274, 0.11026624447191274), (4.171344684756256, -2e-17))
        make_face()
    extrude(amount=12.7)
    with BuildSketch(Plane(origin=(-13.854769017980647, 3.7411998688126173, -9.525), x_dir=(-0.965421853388659, 0.26069262551826505, 0), z_dir=(0, 0, 1))) as fillet2_piece_15:
        with BuildLine():
            CenterArc((3.095213314069046, -3.429), FILLET2_R, 90, 78.8804290465473)
            ThreePointArc((-0.26941353935855566, -2.7676928571428574), (-0.06751218545229724, -1.390387302756799), (0, 0))
            Line((0, 0), (3.095213314069046, 7e-17))
        make_face()
    extrude(amount=12.7)
    with BuildSketch(Plane(origin=(-3.741199868812666, 13.854769017980633, -9.525), x_dir=(-0.9356231316515938, -0.35300050356687074, 0), z_dir=(0, 0, 1))) as fillet2_piece_16:
        with BuildLine():
            CenterArc((3.1129910406855745, -3.4128687698476816), FILLET2_R, 95.55978547672635, 78.8804290465473)
            Line((-0.2998777291621067, -3.0806523346757038), (0, 0))
            ThreePointArc((0, 0), (1.3903873027567981, -0.0675121854522969), (2.780774605513597, 1e-17))
        make_face()
    extrude(amount=12.7)


solid = part.part
